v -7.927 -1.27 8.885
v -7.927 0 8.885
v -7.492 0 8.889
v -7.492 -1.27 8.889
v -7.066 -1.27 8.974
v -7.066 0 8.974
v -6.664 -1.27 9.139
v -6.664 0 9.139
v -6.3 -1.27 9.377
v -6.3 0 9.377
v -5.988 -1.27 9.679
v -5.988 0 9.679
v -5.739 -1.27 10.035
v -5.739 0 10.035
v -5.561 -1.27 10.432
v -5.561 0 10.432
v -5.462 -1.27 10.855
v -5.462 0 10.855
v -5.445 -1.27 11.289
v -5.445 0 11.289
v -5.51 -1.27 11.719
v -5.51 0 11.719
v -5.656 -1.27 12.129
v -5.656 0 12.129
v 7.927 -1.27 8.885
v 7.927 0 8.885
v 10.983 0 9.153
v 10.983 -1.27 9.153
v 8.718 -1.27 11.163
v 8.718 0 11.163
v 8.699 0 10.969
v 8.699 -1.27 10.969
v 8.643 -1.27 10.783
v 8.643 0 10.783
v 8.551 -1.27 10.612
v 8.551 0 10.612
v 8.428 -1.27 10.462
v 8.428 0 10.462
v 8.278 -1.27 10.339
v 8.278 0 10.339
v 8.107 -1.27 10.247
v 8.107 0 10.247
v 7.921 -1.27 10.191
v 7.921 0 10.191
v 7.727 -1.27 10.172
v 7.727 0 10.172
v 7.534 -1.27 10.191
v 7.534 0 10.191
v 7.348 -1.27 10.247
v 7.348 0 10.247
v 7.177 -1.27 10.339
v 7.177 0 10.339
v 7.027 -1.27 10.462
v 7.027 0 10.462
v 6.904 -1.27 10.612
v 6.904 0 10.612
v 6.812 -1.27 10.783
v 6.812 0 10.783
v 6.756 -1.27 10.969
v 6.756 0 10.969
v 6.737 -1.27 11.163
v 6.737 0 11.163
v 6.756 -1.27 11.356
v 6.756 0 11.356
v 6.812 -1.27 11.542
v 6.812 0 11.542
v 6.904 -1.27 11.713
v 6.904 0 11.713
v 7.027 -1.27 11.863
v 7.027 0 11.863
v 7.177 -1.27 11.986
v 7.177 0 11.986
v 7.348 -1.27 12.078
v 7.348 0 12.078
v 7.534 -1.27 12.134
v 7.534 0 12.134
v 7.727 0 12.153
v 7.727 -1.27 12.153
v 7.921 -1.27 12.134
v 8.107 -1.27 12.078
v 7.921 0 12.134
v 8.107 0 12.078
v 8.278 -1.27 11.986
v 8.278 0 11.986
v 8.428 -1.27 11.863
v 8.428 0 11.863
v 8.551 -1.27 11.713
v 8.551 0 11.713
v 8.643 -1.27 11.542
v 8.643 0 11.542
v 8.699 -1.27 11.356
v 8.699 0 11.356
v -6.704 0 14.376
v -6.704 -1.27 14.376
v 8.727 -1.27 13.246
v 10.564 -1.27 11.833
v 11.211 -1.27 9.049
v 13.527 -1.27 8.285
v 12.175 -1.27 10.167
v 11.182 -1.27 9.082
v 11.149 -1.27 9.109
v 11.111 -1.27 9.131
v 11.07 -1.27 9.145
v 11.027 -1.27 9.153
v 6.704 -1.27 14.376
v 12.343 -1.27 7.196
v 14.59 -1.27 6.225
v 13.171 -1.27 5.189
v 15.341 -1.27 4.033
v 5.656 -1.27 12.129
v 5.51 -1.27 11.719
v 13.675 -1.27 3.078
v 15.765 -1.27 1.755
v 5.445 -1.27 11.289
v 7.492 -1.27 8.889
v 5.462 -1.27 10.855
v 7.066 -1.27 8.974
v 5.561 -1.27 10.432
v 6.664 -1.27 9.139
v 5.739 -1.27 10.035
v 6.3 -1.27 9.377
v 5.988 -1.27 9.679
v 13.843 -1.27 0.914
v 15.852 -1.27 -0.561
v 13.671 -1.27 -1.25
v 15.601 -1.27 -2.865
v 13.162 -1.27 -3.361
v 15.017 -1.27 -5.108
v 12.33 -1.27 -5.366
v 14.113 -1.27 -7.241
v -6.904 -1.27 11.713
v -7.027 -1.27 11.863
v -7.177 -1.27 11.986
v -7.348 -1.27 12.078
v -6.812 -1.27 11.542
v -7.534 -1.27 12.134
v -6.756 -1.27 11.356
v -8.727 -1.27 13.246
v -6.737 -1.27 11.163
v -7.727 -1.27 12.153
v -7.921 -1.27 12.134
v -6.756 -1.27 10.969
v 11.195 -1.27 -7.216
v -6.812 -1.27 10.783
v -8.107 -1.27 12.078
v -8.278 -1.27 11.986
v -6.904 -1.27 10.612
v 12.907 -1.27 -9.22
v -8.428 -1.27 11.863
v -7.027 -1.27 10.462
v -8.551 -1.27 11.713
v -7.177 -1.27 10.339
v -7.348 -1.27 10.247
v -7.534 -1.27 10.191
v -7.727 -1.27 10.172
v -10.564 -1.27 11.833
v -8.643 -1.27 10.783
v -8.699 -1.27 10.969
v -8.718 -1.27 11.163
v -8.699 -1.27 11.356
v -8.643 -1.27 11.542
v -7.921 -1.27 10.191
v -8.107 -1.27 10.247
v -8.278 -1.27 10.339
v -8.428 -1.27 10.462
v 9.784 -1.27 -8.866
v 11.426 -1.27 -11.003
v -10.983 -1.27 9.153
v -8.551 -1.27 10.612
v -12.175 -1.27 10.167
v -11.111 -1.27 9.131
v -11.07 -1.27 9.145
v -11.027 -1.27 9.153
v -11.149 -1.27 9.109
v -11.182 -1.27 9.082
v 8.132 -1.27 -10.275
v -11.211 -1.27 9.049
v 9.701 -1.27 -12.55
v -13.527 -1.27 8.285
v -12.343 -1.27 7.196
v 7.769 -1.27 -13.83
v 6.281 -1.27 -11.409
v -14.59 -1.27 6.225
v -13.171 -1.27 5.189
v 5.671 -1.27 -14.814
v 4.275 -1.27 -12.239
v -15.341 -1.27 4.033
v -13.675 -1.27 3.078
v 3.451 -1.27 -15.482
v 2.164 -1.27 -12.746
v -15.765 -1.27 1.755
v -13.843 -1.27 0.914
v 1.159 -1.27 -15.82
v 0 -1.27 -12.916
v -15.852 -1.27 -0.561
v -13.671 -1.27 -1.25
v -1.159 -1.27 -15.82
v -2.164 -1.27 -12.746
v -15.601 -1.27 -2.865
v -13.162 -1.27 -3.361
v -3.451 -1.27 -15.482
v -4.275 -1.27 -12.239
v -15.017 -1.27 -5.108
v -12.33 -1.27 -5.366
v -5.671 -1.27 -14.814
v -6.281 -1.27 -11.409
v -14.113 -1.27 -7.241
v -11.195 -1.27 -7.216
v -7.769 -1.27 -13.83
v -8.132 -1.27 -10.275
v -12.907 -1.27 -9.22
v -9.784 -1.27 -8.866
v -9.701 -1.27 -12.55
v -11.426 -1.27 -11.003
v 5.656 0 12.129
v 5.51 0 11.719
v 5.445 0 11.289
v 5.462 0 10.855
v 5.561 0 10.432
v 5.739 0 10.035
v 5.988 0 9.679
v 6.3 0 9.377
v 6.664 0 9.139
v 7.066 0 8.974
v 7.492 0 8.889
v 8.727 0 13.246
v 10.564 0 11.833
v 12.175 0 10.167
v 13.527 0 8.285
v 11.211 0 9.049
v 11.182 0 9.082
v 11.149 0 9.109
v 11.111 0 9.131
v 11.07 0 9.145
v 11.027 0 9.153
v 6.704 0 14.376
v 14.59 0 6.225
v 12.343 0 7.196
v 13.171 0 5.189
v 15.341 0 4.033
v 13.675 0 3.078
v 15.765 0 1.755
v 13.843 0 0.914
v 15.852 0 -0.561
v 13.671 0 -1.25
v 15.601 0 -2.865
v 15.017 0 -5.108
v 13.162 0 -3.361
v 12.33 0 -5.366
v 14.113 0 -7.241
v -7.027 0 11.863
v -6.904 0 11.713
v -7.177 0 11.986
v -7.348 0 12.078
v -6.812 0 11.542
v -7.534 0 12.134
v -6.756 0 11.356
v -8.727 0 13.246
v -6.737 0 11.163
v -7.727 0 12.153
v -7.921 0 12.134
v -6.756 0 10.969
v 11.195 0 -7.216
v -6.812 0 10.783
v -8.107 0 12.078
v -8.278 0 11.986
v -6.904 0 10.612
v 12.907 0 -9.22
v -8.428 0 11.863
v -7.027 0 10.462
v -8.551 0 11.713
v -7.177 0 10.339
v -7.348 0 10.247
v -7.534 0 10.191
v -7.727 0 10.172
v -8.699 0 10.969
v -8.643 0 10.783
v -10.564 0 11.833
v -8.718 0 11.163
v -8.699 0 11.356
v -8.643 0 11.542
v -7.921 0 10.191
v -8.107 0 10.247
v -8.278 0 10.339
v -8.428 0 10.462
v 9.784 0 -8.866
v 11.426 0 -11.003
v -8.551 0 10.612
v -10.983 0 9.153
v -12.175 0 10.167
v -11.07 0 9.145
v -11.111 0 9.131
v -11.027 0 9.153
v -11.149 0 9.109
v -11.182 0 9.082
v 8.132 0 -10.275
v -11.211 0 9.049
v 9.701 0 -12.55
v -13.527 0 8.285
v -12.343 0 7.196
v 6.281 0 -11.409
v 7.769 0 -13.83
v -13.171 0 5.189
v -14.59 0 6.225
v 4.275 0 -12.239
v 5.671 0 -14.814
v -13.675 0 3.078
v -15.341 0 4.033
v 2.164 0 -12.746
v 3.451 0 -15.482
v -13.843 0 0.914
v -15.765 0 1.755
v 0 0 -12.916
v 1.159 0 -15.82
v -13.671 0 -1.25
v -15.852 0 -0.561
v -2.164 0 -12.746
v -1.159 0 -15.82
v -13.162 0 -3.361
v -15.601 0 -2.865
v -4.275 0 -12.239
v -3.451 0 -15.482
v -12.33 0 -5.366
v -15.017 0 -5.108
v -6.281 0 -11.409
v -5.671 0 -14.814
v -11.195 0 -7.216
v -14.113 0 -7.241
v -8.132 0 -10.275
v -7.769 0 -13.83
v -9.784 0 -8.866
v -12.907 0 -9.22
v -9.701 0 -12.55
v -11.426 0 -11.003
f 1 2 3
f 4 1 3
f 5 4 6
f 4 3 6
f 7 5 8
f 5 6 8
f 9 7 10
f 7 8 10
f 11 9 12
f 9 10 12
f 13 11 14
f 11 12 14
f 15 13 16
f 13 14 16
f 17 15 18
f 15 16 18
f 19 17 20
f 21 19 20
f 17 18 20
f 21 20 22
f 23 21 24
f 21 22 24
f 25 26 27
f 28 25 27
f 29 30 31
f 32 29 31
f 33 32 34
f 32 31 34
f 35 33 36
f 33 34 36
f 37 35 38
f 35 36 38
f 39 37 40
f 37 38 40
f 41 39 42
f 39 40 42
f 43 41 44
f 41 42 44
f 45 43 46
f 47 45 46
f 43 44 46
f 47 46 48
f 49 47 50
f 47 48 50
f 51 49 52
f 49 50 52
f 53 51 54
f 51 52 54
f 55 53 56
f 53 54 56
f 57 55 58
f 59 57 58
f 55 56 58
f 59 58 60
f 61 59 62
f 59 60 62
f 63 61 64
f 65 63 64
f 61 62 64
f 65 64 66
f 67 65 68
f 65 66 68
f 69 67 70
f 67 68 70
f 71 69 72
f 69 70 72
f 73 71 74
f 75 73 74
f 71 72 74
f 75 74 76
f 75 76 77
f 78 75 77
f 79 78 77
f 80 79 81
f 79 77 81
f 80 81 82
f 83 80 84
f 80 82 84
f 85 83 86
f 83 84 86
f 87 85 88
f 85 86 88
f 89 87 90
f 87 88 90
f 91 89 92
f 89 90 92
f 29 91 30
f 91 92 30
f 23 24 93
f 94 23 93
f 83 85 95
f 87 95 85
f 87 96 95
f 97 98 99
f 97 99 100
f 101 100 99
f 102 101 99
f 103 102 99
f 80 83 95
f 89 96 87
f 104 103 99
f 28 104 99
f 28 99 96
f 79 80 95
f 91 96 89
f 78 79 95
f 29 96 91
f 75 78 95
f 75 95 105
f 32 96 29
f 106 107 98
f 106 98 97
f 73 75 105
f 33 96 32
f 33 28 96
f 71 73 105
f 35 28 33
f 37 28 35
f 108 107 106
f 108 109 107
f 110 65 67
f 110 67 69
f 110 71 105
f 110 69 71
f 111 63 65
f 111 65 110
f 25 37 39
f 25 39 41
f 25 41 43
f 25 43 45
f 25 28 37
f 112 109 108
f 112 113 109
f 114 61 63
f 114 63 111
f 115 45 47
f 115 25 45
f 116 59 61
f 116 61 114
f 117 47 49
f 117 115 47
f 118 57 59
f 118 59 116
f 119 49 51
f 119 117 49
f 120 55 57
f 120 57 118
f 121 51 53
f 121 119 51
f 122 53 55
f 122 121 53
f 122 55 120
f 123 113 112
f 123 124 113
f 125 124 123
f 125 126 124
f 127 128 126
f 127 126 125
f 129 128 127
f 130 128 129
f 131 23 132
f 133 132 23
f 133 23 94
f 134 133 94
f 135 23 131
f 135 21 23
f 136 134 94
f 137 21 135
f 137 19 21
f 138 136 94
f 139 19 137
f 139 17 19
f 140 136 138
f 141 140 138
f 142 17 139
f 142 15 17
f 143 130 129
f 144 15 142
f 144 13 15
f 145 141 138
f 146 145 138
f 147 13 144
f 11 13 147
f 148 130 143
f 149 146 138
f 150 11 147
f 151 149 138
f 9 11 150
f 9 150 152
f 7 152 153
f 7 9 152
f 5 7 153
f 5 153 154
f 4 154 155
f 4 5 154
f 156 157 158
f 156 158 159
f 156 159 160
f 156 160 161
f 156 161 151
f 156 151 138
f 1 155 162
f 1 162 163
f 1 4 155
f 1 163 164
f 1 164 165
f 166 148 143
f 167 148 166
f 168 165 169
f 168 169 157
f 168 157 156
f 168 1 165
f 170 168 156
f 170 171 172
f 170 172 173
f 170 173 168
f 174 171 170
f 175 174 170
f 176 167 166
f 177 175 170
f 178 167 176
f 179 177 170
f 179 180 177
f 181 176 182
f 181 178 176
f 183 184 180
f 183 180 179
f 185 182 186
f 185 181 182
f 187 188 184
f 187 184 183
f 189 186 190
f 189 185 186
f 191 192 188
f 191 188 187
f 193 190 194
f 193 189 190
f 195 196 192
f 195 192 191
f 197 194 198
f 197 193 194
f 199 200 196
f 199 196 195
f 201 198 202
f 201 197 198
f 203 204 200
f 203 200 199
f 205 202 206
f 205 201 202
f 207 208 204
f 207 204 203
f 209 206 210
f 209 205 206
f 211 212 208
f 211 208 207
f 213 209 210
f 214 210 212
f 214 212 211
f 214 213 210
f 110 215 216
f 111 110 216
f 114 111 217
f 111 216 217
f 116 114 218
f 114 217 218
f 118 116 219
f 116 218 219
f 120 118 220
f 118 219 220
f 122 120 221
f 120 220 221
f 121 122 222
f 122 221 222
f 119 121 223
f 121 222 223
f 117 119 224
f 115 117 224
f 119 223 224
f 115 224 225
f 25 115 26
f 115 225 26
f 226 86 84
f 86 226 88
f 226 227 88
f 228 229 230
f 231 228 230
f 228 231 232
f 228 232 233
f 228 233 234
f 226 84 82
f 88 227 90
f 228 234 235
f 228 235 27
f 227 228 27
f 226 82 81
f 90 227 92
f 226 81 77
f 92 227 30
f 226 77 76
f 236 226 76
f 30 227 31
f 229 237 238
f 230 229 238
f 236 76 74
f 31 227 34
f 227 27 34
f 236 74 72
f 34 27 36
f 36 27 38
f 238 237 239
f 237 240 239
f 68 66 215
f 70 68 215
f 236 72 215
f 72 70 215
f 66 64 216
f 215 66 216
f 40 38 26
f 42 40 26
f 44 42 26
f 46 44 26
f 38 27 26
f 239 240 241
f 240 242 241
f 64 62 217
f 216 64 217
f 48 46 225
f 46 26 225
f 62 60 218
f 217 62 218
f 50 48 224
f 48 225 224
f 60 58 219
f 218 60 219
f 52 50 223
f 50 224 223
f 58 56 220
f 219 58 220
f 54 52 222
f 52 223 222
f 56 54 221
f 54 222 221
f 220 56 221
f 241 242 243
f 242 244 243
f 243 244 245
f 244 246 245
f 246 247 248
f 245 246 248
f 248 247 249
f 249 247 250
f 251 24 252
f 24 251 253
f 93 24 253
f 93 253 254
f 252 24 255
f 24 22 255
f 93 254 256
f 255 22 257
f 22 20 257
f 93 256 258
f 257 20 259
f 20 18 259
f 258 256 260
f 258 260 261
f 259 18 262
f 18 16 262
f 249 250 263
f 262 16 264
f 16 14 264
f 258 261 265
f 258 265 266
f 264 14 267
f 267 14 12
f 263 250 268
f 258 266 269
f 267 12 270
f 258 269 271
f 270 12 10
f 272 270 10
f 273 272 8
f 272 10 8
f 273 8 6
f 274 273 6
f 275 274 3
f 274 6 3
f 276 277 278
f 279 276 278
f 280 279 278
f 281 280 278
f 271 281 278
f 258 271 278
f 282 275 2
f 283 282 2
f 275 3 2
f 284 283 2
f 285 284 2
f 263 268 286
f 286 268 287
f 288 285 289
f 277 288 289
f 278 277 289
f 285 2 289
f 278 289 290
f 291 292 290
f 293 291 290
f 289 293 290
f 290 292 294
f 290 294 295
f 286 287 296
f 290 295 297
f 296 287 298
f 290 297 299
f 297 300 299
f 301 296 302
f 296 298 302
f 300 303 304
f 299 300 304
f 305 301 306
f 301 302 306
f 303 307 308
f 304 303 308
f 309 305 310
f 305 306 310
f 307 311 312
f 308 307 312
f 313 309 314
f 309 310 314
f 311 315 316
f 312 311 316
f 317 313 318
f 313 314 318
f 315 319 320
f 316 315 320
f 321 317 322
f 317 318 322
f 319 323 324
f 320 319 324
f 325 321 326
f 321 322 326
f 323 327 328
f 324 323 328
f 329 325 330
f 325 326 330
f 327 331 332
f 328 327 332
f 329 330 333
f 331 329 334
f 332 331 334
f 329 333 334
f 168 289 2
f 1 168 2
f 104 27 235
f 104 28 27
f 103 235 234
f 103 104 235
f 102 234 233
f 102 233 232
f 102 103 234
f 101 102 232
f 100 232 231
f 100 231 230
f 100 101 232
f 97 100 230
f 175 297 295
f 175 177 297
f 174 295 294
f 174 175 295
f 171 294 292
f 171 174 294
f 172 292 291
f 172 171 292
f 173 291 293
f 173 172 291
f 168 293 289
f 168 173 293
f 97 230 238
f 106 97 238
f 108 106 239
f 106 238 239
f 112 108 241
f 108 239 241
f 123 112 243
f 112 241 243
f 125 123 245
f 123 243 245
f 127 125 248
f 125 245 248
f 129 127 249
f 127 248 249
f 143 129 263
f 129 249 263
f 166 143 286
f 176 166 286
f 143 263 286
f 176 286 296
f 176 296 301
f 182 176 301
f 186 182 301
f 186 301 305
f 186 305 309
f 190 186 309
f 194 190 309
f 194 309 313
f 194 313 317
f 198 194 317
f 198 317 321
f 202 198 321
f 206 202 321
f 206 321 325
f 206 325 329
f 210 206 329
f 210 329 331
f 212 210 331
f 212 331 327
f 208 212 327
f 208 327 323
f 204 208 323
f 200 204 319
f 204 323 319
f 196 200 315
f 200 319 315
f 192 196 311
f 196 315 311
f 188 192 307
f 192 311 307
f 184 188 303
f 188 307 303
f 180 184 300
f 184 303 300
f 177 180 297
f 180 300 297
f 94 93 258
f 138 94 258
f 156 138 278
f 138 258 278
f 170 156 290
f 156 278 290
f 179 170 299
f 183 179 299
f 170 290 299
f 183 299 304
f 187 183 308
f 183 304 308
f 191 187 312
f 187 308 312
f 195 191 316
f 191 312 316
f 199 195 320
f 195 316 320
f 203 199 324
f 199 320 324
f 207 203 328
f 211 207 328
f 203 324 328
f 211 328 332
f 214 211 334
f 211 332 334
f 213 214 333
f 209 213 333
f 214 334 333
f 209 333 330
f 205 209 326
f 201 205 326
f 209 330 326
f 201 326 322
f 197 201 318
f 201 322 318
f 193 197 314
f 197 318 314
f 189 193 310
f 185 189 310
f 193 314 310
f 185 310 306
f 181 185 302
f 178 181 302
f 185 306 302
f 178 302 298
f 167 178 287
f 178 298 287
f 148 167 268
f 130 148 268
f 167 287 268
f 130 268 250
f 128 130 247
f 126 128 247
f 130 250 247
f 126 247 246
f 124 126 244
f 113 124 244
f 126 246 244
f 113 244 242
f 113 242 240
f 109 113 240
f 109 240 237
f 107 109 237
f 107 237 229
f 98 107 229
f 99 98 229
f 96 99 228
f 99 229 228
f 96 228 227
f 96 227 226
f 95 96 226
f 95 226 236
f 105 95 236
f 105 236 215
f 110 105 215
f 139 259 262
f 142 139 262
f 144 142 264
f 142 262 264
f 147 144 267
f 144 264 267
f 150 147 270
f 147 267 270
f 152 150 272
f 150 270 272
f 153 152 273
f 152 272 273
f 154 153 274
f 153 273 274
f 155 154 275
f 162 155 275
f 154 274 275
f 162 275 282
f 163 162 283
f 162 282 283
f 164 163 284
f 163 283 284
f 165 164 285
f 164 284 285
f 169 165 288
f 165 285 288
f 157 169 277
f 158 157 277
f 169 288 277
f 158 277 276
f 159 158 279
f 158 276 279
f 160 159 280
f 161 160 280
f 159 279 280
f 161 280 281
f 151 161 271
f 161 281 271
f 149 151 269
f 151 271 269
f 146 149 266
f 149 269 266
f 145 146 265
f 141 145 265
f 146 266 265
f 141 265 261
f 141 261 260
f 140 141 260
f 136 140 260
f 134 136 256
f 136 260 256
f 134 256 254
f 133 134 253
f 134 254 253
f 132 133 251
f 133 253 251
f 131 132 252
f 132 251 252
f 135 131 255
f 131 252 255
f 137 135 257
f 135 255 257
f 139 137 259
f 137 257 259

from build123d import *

# Parameters (mm, degrees)
SKETCH2_R      = 0.9906
EXTRUDE1_DEPTH = 1.27
FILLET1_R      = 0.254


with BuildPart() as part:
    # Sketch2 → Extrude1 (new body)
    with BuildSketch(Plane(origin=(0, 0, 0), x_dir=(1, 0, 0), z_dir=(0, 1, 0))):
        with BuildLine():
            Line((6.703697653, -14.37612601), (5.655670247, -12.128623984))
            ThreePointArc((5.655670247, -12.128623984), (5.854908275, -9.851322904), (7.926727876, -8.885217558))
            Line((7.926727876, -8.885217558), (11.125604013, -9.165082956))
            ThreePointArc((11.125604013, -9.165082956), (0, 12.9159), (-11.125604013, -9.165082956))
            Line((-11.125604013, -9.165082956), (-7.926727876, -8.885217558))
            ThreePointArc((-7.926727876, -8.885217558), (-5.854908275, -9.851322904), (-5.655670247, -12.128623984))
            Line((-5.655670247, -12.128623984), (-6.703697653, -14.37612601))
            ThreePointArc((-6.703697653, -14.37612601), (0, 15.8623), (6.703697653, -14.37612601))
        make_face()
        with Locations((7.727489848, -11.162518638)):
            Circle(SKETCH2_R, mode=Mode.SUBTRACT)
        with Locations((-7.727489848, -11.162518638)):
            Circle(SKETCH2_R, mode=Mode.SUBTRACT)
    extrude(amount=-EXTRUDE1_DEPTH)

    # Fillet1
    fillet1_edges = [part.edges().sort_by_distance(p)[0] for p in [
        (11.125604013, -0.635, 9.165082956),
        (-11.125604013, -0.635, 9.165082956),
    ]]
    fillet(fillet1_edges, radius=FILLET1_R)


solid = part.part
